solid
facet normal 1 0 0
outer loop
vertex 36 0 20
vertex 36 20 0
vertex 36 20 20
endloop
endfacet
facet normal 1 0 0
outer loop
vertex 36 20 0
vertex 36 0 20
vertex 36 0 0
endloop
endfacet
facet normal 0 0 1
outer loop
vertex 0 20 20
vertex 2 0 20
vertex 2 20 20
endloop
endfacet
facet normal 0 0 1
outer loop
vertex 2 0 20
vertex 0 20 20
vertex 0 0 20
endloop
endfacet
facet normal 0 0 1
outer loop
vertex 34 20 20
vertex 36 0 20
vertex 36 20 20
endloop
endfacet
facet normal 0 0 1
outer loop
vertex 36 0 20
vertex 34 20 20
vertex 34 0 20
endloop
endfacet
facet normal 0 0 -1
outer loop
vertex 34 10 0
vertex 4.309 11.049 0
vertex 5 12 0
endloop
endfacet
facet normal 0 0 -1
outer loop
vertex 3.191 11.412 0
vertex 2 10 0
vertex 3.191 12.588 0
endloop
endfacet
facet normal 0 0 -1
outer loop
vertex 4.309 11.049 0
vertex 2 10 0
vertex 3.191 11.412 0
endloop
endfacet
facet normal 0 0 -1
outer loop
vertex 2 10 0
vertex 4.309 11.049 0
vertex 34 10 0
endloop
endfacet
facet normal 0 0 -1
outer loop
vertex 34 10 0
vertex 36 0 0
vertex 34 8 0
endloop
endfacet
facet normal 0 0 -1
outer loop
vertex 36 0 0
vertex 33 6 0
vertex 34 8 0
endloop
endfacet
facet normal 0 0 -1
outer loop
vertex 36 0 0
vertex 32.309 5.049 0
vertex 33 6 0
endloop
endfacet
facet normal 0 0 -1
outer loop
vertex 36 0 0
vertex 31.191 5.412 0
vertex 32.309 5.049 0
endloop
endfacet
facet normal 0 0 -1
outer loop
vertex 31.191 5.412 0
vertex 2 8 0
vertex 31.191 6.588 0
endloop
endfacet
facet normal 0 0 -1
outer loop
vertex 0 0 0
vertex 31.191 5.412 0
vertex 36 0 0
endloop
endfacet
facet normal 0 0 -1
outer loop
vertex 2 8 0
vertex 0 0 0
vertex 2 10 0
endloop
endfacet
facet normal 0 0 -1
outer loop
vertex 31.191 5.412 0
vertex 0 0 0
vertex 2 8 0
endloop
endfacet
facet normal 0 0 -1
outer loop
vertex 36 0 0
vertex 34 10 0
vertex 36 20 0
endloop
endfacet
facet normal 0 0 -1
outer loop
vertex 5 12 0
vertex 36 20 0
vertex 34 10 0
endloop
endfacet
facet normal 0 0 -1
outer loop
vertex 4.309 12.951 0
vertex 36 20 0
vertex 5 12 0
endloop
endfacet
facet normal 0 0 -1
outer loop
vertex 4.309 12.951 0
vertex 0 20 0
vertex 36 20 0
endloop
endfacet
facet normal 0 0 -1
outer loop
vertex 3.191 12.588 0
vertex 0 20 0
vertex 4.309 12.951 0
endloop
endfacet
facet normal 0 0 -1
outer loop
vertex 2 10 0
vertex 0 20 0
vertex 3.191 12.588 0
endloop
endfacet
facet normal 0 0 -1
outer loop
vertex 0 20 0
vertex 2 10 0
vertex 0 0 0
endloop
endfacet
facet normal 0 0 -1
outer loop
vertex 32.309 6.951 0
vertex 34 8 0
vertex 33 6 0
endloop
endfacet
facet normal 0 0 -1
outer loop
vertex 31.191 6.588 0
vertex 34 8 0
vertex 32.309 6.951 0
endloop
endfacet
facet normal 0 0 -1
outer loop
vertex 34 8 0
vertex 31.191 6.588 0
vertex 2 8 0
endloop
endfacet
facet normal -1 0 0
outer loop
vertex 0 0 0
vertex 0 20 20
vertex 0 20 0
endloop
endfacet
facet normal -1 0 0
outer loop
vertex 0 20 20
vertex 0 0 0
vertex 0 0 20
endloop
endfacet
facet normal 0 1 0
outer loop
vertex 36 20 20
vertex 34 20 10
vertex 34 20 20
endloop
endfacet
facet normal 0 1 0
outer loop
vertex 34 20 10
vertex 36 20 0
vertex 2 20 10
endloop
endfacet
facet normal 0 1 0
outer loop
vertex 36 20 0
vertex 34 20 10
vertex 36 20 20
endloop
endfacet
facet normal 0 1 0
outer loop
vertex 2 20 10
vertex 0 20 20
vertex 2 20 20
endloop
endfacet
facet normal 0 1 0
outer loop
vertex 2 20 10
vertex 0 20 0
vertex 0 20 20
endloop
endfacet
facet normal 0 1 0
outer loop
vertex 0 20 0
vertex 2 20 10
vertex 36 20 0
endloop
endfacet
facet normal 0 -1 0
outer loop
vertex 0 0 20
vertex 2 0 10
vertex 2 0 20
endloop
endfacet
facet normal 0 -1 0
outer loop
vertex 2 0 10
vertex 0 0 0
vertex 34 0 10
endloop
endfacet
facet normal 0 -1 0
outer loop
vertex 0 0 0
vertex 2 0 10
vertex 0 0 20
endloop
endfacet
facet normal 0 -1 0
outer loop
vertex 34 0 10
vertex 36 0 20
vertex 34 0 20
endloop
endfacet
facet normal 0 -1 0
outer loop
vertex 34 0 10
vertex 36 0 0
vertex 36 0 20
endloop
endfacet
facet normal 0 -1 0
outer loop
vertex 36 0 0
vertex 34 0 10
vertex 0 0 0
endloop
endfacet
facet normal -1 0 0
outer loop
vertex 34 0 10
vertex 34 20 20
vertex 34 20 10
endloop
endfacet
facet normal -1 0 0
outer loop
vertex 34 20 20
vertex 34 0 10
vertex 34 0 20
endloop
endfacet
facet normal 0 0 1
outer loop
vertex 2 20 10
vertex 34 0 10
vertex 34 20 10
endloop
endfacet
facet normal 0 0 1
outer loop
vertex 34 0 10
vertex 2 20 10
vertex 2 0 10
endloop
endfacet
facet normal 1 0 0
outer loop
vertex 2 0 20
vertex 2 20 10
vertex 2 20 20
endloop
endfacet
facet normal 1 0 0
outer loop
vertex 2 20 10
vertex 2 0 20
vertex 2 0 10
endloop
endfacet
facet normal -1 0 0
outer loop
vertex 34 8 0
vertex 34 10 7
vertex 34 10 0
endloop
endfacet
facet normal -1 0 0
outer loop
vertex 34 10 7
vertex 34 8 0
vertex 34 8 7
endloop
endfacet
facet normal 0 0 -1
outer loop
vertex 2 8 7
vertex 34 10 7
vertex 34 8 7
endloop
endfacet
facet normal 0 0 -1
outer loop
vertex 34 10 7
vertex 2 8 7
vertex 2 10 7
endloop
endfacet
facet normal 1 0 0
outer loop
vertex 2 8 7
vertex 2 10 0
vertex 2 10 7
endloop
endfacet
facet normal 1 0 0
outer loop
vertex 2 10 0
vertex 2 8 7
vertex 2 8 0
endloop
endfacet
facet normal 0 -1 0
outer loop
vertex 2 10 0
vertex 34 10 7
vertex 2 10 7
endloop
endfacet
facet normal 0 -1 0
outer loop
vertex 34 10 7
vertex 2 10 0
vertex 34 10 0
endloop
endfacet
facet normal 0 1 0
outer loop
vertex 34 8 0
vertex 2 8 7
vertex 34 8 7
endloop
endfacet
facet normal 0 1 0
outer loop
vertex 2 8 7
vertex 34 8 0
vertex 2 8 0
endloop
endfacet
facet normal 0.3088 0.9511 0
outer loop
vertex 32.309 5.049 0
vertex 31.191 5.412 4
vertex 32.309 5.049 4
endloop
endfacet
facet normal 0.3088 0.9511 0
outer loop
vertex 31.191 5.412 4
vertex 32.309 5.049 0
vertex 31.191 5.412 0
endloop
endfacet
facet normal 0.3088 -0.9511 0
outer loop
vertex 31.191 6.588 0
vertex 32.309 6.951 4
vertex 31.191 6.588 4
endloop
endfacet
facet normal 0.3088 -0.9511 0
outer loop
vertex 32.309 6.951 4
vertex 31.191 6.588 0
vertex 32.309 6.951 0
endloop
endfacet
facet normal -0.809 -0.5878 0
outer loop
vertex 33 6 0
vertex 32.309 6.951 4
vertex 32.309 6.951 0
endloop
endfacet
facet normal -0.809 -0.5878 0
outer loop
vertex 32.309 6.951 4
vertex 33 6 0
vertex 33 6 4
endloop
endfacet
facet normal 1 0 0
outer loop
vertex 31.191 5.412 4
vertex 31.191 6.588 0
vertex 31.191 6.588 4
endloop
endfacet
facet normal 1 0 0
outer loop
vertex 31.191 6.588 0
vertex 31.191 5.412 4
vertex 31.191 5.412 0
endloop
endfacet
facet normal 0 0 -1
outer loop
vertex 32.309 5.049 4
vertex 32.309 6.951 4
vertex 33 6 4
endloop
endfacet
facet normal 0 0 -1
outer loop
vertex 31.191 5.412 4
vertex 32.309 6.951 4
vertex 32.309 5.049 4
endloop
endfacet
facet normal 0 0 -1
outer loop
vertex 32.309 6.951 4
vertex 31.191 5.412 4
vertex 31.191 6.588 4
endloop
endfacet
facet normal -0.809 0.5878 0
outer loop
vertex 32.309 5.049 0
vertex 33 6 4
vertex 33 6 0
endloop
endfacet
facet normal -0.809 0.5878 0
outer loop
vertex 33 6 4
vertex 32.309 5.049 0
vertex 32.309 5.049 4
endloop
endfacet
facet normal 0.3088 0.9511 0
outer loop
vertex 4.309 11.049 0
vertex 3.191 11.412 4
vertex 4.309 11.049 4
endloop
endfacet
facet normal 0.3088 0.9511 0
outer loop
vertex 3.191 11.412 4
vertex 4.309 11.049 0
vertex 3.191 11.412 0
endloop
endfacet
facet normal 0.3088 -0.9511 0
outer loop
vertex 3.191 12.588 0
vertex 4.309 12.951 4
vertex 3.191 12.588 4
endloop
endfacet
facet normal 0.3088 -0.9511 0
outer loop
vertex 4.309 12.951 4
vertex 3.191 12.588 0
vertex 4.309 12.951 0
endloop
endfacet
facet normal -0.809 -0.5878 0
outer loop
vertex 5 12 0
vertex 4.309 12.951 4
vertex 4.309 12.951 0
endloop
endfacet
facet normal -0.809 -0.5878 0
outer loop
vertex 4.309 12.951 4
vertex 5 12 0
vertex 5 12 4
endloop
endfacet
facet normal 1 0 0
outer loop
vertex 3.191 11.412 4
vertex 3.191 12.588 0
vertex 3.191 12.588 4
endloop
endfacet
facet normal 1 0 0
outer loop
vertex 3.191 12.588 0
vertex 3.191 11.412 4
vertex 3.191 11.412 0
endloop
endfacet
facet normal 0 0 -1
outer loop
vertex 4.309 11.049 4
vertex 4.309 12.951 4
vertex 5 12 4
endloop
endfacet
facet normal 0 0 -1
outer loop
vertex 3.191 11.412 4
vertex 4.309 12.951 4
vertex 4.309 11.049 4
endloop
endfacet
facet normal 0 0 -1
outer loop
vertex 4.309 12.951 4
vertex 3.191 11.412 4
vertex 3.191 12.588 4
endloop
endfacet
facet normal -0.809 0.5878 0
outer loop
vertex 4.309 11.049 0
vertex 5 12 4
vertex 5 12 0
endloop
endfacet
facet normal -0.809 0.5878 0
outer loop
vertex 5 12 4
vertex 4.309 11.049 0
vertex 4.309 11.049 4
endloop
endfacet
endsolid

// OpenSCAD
width = 36;
length = 20;
heightOfWheels = 10;
walls = (width - 32)/2;
screwR = 1;
difference() {
	cube([width, length, 20]);
	translate([walls, -1,heightOfWheels])cube([32,100,100]);
	translate([walls,length/2-2,-1])cube([width-walls * 2,2,heightOfWheels -2]);
	translate([width-walls * 2,length/2-4,-1])cylinder(r=screwR, h=5);
	translate([width-walls * 16,length/2+2,-1])cylinder(r=screwR, h=5);
}
